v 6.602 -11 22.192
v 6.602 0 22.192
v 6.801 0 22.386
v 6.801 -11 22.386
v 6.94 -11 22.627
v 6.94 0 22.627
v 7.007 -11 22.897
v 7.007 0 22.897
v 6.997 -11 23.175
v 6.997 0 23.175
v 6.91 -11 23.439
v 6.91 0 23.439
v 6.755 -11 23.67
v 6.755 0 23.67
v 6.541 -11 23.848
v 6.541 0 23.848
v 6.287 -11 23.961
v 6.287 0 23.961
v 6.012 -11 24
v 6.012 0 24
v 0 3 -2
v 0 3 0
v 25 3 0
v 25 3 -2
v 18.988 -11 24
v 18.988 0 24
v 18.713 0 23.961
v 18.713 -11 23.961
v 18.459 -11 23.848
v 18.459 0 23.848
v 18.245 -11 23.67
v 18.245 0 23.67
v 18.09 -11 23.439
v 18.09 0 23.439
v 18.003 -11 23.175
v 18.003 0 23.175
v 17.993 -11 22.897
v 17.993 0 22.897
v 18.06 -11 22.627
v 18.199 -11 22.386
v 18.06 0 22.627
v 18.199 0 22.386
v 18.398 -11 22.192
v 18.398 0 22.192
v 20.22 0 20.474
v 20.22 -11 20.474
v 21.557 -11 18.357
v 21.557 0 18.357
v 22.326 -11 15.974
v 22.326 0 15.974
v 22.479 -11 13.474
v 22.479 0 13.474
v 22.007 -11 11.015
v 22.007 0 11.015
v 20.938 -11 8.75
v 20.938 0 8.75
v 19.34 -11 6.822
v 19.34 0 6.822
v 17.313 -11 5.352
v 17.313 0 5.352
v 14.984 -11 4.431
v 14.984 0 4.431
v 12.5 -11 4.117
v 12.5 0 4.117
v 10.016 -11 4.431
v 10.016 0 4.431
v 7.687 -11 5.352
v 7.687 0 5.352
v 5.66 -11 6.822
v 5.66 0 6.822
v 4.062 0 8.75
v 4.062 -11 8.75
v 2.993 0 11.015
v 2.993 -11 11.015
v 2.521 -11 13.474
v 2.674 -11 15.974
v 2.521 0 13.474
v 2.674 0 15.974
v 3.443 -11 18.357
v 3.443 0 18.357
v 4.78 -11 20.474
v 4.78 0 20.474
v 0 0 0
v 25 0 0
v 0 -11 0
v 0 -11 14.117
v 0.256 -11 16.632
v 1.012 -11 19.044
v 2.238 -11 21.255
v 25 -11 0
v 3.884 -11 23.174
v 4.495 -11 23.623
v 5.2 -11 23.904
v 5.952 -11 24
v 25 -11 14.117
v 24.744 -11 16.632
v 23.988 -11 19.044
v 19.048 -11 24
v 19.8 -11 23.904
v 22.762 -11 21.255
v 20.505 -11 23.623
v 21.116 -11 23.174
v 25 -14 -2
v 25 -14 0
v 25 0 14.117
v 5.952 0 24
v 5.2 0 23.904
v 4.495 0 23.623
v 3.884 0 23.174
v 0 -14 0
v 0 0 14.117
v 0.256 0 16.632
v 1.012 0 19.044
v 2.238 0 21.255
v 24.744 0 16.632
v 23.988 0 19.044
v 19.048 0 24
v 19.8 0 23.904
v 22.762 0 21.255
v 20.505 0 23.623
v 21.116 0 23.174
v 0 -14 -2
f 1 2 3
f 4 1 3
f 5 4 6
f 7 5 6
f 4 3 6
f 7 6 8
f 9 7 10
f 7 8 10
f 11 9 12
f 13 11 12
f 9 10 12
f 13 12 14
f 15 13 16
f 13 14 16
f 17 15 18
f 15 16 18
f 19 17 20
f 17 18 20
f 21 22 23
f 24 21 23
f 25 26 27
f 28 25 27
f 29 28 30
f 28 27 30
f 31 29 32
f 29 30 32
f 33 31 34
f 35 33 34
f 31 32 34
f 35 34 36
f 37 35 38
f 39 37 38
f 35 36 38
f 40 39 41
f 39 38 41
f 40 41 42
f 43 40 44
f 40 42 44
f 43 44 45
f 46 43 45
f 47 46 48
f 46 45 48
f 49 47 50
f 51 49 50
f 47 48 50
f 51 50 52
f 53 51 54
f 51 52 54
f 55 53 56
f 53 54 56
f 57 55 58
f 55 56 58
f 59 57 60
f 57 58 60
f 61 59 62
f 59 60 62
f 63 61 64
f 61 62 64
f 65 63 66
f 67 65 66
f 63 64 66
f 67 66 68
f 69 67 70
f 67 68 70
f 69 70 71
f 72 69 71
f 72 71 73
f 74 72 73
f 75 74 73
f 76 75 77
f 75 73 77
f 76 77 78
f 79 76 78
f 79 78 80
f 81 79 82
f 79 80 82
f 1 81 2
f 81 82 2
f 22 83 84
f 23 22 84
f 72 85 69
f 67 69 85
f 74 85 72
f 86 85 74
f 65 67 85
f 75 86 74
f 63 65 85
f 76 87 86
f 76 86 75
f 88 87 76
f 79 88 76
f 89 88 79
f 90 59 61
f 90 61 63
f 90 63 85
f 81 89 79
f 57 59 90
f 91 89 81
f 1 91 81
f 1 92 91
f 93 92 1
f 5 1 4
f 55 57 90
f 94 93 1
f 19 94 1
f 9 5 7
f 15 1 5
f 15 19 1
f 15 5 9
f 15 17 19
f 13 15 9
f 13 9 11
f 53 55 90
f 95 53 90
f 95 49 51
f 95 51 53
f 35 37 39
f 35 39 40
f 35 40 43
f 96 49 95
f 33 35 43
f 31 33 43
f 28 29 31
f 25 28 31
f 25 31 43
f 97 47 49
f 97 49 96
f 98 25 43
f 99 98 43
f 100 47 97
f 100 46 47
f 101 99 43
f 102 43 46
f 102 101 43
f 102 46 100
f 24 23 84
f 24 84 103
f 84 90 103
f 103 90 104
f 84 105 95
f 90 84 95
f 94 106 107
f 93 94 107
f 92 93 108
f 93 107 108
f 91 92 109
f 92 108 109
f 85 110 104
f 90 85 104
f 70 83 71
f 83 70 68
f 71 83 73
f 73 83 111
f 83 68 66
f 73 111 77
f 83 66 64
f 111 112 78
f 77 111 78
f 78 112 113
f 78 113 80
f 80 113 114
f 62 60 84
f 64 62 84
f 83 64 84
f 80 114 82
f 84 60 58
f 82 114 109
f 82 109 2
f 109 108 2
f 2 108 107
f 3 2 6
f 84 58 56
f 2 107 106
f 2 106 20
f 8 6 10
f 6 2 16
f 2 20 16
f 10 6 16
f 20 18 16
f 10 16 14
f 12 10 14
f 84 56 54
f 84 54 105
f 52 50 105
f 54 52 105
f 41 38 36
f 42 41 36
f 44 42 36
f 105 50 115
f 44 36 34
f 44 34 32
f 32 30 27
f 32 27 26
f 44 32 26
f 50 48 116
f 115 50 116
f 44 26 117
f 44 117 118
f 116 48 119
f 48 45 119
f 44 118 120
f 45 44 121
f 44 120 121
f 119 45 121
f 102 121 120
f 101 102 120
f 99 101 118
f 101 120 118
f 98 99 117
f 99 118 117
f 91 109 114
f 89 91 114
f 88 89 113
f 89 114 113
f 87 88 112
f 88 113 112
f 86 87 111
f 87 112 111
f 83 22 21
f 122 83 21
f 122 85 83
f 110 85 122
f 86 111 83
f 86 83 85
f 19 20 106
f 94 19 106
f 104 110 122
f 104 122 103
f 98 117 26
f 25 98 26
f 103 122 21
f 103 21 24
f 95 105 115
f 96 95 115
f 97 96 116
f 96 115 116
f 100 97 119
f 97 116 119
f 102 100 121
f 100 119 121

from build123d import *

# Parameters (mm, degrees)
F1_DEPTH = 11
F2_W     = 25
F2_H     = 17
F3_DEPTH = 2


with BuildPart() as f1:
    # F0 (on Front) → F1 (new body)
    with BuildSketch(Plane.XZ):
        with BuildLine():
            Line((0, 14.117118), (0, 0))
            Line((0, 0), (25, 0))
            Line((25, 0), (25, 14.117118))
            ThreePointArc((25, 14.117118), (23.98797, 19.044242), (21.115752, 23.173542))
            ThreePointArc((21.115752, 23.173542), (20.161384, 23.785734), (19.047972, 24))
            Line((19.047972, 24), (18.98802, 24))
            ThreePointArc((18.98802, 24), (18.037353, 23.310214), (18.3982, 22.192465))
            ThreePointArc((18.3982, 22.192465), (12.5, 4.117118), (6.6018, 22.192465))
            ThreePointArc((6.6018, 22.192465), (6.962647, 23.310214), (6.01198, 24))
            Line((6.01198, 24), (5.952028, 24))
            ThreePointArc((5.952028, 24), (4.838616, 23.785734), (3.884248, 23.173542))
            ThreePointArc((3.884248, 23.173542), (1.01203, 19.044242), (0, 14.117118))
        make_face()
    extrude(amount=F1_DEPTH)

    # F2 (on face) → F3 (join)
    with BuildSketch(Plane(origin=(0, 0, 0), x_dir=(1, 0, 0), z_dir=(0, 0, -1))):
        with Locations((12.5, 5.5)):
            Rectangle(F2_W, F2_H)
    extrude(amount=F3_DEPTH)


solid = f1.part
